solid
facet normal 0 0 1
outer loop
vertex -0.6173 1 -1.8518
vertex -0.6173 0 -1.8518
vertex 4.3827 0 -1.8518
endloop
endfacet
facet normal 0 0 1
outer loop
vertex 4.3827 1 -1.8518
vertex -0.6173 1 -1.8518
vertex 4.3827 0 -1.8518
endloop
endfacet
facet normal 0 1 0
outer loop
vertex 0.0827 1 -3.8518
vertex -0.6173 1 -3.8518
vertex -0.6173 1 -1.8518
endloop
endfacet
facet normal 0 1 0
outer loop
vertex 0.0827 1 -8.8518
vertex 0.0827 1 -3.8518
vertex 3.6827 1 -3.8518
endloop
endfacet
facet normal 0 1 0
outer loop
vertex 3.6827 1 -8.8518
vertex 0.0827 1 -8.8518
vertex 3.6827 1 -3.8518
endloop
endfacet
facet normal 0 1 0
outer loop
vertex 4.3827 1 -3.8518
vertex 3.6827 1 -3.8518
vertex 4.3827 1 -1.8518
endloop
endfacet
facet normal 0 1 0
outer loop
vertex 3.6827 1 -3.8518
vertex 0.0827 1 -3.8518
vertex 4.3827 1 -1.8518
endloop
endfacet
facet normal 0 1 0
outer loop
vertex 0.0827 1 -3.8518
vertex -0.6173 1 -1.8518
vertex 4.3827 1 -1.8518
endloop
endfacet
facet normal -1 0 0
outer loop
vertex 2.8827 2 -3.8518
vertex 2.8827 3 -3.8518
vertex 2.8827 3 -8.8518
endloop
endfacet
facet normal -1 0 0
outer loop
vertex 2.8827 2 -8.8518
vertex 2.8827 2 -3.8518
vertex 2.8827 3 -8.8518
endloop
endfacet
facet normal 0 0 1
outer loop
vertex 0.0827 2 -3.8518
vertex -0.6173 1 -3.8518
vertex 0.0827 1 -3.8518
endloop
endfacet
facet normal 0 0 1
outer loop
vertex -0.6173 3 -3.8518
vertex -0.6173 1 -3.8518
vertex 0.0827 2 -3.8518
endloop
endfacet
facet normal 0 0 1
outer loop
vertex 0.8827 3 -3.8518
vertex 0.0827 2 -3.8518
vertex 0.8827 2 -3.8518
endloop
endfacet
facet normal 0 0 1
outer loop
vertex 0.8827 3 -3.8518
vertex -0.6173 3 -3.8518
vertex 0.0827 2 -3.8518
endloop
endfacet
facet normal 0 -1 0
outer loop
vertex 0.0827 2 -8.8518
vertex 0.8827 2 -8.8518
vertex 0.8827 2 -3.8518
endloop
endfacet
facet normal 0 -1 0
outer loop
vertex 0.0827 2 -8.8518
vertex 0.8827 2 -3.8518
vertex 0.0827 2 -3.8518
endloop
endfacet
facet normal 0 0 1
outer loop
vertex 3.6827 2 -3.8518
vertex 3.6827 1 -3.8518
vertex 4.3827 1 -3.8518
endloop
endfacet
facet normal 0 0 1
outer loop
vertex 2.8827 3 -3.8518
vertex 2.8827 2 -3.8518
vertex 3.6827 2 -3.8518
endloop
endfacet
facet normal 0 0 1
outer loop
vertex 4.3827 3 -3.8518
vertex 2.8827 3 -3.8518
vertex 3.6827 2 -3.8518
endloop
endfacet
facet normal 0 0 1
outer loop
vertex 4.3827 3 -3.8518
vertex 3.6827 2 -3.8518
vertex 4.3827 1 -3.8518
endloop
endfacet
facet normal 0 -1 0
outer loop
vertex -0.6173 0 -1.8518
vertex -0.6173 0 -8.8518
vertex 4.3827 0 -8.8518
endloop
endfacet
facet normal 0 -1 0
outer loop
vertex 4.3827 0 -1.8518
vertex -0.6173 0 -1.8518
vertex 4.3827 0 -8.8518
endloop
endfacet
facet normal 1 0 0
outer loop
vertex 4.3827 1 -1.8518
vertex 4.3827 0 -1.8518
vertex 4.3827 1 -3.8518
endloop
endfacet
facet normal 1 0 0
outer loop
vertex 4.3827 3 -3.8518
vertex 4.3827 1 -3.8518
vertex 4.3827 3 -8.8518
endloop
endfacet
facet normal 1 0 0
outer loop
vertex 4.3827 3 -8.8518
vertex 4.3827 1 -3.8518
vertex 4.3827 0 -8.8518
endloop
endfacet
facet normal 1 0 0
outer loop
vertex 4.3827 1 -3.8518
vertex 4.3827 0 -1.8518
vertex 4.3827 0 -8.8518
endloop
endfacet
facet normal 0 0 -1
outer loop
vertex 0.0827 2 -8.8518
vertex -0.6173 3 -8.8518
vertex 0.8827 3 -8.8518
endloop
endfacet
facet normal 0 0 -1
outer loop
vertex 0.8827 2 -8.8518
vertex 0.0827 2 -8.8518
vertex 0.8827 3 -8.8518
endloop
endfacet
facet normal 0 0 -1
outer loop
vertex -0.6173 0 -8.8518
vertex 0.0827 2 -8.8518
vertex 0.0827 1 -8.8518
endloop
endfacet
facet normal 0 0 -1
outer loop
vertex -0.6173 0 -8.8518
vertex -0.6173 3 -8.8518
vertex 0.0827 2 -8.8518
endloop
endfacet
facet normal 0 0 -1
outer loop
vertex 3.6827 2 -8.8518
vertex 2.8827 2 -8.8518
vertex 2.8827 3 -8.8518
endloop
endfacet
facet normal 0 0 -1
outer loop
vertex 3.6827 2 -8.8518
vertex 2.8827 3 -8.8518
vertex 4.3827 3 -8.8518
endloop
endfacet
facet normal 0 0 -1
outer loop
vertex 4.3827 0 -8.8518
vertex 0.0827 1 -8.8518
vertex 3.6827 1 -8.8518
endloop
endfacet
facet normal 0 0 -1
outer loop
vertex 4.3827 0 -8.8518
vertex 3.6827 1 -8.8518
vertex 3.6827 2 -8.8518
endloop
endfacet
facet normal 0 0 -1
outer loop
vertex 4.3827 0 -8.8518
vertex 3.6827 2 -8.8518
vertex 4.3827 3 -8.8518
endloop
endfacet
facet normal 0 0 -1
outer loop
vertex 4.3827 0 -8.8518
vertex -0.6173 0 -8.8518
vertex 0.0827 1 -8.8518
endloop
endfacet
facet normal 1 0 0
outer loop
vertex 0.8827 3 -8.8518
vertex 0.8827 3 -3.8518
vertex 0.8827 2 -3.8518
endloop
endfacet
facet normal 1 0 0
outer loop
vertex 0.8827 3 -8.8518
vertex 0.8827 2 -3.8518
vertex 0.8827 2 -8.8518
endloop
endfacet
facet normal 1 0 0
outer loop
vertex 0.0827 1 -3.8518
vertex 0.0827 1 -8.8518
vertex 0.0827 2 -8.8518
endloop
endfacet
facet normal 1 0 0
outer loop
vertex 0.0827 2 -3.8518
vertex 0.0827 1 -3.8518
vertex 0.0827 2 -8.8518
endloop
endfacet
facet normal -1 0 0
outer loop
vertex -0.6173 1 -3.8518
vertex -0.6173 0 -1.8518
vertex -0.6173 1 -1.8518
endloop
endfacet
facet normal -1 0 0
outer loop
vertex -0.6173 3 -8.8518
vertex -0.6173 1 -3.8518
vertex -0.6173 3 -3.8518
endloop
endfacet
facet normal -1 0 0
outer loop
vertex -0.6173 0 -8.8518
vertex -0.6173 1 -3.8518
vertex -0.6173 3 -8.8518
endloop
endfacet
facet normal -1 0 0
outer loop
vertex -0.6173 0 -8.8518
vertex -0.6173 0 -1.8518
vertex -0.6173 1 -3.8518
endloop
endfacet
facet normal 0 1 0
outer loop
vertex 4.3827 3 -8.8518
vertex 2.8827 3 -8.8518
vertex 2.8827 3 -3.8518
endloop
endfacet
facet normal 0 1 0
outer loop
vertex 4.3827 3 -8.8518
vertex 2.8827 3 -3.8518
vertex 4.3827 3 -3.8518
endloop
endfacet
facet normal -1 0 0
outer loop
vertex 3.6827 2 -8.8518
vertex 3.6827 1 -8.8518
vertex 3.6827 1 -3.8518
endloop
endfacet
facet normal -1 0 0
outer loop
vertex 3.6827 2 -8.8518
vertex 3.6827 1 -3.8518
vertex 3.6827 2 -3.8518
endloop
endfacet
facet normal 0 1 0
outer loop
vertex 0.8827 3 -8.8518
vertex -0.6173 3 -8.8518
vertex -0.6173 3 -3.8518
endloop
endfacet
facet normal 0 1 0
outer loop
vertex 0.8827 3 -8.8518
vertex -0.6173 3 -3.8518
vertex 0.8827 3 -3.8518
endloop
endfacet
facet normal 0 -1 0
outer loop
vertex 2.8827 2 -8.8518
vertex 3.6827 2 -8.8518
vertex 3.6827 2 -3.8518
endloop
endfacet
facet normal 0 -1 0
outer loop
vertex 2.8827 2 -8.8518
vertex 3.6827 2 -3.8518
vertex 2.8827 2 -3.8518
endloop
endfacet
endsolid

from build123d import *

# Parameters (mm, degrees)
SKETCH1_W           = 5
SKETCH1_H           = 7
BOSS_EXTRUDE1_DEPTH = 3
SKETCH2_W           = 2
SKETCH2_H           = 7
CUT_EXTRUDE1_DEPTH  = 2
SKETCH3_W           = 3.6
SKETCH3_H           = 1
CUT_EXTRUDE2_DEPTH  = 9.786829282
SKETCH4_W           = 5
SKETCH4_H           = 2
CUT_EXTRUDE3_DEPTH  = 2


with BuildPart() as part:
    # Sketch1 → Boss-Extrude1 (new body)
    with BuildSketch(Plane(origin=(0, 0, 0), x_dir=(1, 0, 0), z_dir=(0, 1, 0))):
        with Locations((1.882735313, 5.351794061)):
            Rectangle(SKETCH1_W, SKETCH1_H)
    extrude(amount=BOSS_EXTRUDE1_DEPTH)

    # Sketch2 → Cut-Extrude1 (cut)
    with BuildSketch(Plane(origin=(0, 3, 0), x_dir=(1, 0, 0), z_dir=(0, 1, 0))):
        with Locations((1.882735313, 5.351794061)):
            Rectangle(SKETCH2_W, SKETCH2_H)
    extrude(amount=-CUT_EXTRUDE1_DEPTH, mode=Mode.SUBTRACT)

    # Sketch3 → Cut-Extrude2 (cut, through all)
    with BuildSketch(Plane(origin=(0, 0, -8.851794061), x_dir=(-1, 0, 0), z_dir=(0, 0, -1))):
        with Locations((-1.882735313, 1.5)):
            Rectangle(SKETCH3_W, SKETCH3_H)
    extrude(amount=-CUT_EXTRUDE2_DEPTH, mode=Mode.SUBTRACT)

    # Sketch4 → Cut-Extrude3 (cut)
    with BuildSketch(Plane.XY.offset(-1.851794061)):
        with Locations((1.882735313, 2)):
            Rectangle(SKETCH4_W, SKETCH4_H)
    extrude(amount=-CUT_EXTRUDE3_DEPTH, mode=Mode.SUBTRACT)


solid = part.part
